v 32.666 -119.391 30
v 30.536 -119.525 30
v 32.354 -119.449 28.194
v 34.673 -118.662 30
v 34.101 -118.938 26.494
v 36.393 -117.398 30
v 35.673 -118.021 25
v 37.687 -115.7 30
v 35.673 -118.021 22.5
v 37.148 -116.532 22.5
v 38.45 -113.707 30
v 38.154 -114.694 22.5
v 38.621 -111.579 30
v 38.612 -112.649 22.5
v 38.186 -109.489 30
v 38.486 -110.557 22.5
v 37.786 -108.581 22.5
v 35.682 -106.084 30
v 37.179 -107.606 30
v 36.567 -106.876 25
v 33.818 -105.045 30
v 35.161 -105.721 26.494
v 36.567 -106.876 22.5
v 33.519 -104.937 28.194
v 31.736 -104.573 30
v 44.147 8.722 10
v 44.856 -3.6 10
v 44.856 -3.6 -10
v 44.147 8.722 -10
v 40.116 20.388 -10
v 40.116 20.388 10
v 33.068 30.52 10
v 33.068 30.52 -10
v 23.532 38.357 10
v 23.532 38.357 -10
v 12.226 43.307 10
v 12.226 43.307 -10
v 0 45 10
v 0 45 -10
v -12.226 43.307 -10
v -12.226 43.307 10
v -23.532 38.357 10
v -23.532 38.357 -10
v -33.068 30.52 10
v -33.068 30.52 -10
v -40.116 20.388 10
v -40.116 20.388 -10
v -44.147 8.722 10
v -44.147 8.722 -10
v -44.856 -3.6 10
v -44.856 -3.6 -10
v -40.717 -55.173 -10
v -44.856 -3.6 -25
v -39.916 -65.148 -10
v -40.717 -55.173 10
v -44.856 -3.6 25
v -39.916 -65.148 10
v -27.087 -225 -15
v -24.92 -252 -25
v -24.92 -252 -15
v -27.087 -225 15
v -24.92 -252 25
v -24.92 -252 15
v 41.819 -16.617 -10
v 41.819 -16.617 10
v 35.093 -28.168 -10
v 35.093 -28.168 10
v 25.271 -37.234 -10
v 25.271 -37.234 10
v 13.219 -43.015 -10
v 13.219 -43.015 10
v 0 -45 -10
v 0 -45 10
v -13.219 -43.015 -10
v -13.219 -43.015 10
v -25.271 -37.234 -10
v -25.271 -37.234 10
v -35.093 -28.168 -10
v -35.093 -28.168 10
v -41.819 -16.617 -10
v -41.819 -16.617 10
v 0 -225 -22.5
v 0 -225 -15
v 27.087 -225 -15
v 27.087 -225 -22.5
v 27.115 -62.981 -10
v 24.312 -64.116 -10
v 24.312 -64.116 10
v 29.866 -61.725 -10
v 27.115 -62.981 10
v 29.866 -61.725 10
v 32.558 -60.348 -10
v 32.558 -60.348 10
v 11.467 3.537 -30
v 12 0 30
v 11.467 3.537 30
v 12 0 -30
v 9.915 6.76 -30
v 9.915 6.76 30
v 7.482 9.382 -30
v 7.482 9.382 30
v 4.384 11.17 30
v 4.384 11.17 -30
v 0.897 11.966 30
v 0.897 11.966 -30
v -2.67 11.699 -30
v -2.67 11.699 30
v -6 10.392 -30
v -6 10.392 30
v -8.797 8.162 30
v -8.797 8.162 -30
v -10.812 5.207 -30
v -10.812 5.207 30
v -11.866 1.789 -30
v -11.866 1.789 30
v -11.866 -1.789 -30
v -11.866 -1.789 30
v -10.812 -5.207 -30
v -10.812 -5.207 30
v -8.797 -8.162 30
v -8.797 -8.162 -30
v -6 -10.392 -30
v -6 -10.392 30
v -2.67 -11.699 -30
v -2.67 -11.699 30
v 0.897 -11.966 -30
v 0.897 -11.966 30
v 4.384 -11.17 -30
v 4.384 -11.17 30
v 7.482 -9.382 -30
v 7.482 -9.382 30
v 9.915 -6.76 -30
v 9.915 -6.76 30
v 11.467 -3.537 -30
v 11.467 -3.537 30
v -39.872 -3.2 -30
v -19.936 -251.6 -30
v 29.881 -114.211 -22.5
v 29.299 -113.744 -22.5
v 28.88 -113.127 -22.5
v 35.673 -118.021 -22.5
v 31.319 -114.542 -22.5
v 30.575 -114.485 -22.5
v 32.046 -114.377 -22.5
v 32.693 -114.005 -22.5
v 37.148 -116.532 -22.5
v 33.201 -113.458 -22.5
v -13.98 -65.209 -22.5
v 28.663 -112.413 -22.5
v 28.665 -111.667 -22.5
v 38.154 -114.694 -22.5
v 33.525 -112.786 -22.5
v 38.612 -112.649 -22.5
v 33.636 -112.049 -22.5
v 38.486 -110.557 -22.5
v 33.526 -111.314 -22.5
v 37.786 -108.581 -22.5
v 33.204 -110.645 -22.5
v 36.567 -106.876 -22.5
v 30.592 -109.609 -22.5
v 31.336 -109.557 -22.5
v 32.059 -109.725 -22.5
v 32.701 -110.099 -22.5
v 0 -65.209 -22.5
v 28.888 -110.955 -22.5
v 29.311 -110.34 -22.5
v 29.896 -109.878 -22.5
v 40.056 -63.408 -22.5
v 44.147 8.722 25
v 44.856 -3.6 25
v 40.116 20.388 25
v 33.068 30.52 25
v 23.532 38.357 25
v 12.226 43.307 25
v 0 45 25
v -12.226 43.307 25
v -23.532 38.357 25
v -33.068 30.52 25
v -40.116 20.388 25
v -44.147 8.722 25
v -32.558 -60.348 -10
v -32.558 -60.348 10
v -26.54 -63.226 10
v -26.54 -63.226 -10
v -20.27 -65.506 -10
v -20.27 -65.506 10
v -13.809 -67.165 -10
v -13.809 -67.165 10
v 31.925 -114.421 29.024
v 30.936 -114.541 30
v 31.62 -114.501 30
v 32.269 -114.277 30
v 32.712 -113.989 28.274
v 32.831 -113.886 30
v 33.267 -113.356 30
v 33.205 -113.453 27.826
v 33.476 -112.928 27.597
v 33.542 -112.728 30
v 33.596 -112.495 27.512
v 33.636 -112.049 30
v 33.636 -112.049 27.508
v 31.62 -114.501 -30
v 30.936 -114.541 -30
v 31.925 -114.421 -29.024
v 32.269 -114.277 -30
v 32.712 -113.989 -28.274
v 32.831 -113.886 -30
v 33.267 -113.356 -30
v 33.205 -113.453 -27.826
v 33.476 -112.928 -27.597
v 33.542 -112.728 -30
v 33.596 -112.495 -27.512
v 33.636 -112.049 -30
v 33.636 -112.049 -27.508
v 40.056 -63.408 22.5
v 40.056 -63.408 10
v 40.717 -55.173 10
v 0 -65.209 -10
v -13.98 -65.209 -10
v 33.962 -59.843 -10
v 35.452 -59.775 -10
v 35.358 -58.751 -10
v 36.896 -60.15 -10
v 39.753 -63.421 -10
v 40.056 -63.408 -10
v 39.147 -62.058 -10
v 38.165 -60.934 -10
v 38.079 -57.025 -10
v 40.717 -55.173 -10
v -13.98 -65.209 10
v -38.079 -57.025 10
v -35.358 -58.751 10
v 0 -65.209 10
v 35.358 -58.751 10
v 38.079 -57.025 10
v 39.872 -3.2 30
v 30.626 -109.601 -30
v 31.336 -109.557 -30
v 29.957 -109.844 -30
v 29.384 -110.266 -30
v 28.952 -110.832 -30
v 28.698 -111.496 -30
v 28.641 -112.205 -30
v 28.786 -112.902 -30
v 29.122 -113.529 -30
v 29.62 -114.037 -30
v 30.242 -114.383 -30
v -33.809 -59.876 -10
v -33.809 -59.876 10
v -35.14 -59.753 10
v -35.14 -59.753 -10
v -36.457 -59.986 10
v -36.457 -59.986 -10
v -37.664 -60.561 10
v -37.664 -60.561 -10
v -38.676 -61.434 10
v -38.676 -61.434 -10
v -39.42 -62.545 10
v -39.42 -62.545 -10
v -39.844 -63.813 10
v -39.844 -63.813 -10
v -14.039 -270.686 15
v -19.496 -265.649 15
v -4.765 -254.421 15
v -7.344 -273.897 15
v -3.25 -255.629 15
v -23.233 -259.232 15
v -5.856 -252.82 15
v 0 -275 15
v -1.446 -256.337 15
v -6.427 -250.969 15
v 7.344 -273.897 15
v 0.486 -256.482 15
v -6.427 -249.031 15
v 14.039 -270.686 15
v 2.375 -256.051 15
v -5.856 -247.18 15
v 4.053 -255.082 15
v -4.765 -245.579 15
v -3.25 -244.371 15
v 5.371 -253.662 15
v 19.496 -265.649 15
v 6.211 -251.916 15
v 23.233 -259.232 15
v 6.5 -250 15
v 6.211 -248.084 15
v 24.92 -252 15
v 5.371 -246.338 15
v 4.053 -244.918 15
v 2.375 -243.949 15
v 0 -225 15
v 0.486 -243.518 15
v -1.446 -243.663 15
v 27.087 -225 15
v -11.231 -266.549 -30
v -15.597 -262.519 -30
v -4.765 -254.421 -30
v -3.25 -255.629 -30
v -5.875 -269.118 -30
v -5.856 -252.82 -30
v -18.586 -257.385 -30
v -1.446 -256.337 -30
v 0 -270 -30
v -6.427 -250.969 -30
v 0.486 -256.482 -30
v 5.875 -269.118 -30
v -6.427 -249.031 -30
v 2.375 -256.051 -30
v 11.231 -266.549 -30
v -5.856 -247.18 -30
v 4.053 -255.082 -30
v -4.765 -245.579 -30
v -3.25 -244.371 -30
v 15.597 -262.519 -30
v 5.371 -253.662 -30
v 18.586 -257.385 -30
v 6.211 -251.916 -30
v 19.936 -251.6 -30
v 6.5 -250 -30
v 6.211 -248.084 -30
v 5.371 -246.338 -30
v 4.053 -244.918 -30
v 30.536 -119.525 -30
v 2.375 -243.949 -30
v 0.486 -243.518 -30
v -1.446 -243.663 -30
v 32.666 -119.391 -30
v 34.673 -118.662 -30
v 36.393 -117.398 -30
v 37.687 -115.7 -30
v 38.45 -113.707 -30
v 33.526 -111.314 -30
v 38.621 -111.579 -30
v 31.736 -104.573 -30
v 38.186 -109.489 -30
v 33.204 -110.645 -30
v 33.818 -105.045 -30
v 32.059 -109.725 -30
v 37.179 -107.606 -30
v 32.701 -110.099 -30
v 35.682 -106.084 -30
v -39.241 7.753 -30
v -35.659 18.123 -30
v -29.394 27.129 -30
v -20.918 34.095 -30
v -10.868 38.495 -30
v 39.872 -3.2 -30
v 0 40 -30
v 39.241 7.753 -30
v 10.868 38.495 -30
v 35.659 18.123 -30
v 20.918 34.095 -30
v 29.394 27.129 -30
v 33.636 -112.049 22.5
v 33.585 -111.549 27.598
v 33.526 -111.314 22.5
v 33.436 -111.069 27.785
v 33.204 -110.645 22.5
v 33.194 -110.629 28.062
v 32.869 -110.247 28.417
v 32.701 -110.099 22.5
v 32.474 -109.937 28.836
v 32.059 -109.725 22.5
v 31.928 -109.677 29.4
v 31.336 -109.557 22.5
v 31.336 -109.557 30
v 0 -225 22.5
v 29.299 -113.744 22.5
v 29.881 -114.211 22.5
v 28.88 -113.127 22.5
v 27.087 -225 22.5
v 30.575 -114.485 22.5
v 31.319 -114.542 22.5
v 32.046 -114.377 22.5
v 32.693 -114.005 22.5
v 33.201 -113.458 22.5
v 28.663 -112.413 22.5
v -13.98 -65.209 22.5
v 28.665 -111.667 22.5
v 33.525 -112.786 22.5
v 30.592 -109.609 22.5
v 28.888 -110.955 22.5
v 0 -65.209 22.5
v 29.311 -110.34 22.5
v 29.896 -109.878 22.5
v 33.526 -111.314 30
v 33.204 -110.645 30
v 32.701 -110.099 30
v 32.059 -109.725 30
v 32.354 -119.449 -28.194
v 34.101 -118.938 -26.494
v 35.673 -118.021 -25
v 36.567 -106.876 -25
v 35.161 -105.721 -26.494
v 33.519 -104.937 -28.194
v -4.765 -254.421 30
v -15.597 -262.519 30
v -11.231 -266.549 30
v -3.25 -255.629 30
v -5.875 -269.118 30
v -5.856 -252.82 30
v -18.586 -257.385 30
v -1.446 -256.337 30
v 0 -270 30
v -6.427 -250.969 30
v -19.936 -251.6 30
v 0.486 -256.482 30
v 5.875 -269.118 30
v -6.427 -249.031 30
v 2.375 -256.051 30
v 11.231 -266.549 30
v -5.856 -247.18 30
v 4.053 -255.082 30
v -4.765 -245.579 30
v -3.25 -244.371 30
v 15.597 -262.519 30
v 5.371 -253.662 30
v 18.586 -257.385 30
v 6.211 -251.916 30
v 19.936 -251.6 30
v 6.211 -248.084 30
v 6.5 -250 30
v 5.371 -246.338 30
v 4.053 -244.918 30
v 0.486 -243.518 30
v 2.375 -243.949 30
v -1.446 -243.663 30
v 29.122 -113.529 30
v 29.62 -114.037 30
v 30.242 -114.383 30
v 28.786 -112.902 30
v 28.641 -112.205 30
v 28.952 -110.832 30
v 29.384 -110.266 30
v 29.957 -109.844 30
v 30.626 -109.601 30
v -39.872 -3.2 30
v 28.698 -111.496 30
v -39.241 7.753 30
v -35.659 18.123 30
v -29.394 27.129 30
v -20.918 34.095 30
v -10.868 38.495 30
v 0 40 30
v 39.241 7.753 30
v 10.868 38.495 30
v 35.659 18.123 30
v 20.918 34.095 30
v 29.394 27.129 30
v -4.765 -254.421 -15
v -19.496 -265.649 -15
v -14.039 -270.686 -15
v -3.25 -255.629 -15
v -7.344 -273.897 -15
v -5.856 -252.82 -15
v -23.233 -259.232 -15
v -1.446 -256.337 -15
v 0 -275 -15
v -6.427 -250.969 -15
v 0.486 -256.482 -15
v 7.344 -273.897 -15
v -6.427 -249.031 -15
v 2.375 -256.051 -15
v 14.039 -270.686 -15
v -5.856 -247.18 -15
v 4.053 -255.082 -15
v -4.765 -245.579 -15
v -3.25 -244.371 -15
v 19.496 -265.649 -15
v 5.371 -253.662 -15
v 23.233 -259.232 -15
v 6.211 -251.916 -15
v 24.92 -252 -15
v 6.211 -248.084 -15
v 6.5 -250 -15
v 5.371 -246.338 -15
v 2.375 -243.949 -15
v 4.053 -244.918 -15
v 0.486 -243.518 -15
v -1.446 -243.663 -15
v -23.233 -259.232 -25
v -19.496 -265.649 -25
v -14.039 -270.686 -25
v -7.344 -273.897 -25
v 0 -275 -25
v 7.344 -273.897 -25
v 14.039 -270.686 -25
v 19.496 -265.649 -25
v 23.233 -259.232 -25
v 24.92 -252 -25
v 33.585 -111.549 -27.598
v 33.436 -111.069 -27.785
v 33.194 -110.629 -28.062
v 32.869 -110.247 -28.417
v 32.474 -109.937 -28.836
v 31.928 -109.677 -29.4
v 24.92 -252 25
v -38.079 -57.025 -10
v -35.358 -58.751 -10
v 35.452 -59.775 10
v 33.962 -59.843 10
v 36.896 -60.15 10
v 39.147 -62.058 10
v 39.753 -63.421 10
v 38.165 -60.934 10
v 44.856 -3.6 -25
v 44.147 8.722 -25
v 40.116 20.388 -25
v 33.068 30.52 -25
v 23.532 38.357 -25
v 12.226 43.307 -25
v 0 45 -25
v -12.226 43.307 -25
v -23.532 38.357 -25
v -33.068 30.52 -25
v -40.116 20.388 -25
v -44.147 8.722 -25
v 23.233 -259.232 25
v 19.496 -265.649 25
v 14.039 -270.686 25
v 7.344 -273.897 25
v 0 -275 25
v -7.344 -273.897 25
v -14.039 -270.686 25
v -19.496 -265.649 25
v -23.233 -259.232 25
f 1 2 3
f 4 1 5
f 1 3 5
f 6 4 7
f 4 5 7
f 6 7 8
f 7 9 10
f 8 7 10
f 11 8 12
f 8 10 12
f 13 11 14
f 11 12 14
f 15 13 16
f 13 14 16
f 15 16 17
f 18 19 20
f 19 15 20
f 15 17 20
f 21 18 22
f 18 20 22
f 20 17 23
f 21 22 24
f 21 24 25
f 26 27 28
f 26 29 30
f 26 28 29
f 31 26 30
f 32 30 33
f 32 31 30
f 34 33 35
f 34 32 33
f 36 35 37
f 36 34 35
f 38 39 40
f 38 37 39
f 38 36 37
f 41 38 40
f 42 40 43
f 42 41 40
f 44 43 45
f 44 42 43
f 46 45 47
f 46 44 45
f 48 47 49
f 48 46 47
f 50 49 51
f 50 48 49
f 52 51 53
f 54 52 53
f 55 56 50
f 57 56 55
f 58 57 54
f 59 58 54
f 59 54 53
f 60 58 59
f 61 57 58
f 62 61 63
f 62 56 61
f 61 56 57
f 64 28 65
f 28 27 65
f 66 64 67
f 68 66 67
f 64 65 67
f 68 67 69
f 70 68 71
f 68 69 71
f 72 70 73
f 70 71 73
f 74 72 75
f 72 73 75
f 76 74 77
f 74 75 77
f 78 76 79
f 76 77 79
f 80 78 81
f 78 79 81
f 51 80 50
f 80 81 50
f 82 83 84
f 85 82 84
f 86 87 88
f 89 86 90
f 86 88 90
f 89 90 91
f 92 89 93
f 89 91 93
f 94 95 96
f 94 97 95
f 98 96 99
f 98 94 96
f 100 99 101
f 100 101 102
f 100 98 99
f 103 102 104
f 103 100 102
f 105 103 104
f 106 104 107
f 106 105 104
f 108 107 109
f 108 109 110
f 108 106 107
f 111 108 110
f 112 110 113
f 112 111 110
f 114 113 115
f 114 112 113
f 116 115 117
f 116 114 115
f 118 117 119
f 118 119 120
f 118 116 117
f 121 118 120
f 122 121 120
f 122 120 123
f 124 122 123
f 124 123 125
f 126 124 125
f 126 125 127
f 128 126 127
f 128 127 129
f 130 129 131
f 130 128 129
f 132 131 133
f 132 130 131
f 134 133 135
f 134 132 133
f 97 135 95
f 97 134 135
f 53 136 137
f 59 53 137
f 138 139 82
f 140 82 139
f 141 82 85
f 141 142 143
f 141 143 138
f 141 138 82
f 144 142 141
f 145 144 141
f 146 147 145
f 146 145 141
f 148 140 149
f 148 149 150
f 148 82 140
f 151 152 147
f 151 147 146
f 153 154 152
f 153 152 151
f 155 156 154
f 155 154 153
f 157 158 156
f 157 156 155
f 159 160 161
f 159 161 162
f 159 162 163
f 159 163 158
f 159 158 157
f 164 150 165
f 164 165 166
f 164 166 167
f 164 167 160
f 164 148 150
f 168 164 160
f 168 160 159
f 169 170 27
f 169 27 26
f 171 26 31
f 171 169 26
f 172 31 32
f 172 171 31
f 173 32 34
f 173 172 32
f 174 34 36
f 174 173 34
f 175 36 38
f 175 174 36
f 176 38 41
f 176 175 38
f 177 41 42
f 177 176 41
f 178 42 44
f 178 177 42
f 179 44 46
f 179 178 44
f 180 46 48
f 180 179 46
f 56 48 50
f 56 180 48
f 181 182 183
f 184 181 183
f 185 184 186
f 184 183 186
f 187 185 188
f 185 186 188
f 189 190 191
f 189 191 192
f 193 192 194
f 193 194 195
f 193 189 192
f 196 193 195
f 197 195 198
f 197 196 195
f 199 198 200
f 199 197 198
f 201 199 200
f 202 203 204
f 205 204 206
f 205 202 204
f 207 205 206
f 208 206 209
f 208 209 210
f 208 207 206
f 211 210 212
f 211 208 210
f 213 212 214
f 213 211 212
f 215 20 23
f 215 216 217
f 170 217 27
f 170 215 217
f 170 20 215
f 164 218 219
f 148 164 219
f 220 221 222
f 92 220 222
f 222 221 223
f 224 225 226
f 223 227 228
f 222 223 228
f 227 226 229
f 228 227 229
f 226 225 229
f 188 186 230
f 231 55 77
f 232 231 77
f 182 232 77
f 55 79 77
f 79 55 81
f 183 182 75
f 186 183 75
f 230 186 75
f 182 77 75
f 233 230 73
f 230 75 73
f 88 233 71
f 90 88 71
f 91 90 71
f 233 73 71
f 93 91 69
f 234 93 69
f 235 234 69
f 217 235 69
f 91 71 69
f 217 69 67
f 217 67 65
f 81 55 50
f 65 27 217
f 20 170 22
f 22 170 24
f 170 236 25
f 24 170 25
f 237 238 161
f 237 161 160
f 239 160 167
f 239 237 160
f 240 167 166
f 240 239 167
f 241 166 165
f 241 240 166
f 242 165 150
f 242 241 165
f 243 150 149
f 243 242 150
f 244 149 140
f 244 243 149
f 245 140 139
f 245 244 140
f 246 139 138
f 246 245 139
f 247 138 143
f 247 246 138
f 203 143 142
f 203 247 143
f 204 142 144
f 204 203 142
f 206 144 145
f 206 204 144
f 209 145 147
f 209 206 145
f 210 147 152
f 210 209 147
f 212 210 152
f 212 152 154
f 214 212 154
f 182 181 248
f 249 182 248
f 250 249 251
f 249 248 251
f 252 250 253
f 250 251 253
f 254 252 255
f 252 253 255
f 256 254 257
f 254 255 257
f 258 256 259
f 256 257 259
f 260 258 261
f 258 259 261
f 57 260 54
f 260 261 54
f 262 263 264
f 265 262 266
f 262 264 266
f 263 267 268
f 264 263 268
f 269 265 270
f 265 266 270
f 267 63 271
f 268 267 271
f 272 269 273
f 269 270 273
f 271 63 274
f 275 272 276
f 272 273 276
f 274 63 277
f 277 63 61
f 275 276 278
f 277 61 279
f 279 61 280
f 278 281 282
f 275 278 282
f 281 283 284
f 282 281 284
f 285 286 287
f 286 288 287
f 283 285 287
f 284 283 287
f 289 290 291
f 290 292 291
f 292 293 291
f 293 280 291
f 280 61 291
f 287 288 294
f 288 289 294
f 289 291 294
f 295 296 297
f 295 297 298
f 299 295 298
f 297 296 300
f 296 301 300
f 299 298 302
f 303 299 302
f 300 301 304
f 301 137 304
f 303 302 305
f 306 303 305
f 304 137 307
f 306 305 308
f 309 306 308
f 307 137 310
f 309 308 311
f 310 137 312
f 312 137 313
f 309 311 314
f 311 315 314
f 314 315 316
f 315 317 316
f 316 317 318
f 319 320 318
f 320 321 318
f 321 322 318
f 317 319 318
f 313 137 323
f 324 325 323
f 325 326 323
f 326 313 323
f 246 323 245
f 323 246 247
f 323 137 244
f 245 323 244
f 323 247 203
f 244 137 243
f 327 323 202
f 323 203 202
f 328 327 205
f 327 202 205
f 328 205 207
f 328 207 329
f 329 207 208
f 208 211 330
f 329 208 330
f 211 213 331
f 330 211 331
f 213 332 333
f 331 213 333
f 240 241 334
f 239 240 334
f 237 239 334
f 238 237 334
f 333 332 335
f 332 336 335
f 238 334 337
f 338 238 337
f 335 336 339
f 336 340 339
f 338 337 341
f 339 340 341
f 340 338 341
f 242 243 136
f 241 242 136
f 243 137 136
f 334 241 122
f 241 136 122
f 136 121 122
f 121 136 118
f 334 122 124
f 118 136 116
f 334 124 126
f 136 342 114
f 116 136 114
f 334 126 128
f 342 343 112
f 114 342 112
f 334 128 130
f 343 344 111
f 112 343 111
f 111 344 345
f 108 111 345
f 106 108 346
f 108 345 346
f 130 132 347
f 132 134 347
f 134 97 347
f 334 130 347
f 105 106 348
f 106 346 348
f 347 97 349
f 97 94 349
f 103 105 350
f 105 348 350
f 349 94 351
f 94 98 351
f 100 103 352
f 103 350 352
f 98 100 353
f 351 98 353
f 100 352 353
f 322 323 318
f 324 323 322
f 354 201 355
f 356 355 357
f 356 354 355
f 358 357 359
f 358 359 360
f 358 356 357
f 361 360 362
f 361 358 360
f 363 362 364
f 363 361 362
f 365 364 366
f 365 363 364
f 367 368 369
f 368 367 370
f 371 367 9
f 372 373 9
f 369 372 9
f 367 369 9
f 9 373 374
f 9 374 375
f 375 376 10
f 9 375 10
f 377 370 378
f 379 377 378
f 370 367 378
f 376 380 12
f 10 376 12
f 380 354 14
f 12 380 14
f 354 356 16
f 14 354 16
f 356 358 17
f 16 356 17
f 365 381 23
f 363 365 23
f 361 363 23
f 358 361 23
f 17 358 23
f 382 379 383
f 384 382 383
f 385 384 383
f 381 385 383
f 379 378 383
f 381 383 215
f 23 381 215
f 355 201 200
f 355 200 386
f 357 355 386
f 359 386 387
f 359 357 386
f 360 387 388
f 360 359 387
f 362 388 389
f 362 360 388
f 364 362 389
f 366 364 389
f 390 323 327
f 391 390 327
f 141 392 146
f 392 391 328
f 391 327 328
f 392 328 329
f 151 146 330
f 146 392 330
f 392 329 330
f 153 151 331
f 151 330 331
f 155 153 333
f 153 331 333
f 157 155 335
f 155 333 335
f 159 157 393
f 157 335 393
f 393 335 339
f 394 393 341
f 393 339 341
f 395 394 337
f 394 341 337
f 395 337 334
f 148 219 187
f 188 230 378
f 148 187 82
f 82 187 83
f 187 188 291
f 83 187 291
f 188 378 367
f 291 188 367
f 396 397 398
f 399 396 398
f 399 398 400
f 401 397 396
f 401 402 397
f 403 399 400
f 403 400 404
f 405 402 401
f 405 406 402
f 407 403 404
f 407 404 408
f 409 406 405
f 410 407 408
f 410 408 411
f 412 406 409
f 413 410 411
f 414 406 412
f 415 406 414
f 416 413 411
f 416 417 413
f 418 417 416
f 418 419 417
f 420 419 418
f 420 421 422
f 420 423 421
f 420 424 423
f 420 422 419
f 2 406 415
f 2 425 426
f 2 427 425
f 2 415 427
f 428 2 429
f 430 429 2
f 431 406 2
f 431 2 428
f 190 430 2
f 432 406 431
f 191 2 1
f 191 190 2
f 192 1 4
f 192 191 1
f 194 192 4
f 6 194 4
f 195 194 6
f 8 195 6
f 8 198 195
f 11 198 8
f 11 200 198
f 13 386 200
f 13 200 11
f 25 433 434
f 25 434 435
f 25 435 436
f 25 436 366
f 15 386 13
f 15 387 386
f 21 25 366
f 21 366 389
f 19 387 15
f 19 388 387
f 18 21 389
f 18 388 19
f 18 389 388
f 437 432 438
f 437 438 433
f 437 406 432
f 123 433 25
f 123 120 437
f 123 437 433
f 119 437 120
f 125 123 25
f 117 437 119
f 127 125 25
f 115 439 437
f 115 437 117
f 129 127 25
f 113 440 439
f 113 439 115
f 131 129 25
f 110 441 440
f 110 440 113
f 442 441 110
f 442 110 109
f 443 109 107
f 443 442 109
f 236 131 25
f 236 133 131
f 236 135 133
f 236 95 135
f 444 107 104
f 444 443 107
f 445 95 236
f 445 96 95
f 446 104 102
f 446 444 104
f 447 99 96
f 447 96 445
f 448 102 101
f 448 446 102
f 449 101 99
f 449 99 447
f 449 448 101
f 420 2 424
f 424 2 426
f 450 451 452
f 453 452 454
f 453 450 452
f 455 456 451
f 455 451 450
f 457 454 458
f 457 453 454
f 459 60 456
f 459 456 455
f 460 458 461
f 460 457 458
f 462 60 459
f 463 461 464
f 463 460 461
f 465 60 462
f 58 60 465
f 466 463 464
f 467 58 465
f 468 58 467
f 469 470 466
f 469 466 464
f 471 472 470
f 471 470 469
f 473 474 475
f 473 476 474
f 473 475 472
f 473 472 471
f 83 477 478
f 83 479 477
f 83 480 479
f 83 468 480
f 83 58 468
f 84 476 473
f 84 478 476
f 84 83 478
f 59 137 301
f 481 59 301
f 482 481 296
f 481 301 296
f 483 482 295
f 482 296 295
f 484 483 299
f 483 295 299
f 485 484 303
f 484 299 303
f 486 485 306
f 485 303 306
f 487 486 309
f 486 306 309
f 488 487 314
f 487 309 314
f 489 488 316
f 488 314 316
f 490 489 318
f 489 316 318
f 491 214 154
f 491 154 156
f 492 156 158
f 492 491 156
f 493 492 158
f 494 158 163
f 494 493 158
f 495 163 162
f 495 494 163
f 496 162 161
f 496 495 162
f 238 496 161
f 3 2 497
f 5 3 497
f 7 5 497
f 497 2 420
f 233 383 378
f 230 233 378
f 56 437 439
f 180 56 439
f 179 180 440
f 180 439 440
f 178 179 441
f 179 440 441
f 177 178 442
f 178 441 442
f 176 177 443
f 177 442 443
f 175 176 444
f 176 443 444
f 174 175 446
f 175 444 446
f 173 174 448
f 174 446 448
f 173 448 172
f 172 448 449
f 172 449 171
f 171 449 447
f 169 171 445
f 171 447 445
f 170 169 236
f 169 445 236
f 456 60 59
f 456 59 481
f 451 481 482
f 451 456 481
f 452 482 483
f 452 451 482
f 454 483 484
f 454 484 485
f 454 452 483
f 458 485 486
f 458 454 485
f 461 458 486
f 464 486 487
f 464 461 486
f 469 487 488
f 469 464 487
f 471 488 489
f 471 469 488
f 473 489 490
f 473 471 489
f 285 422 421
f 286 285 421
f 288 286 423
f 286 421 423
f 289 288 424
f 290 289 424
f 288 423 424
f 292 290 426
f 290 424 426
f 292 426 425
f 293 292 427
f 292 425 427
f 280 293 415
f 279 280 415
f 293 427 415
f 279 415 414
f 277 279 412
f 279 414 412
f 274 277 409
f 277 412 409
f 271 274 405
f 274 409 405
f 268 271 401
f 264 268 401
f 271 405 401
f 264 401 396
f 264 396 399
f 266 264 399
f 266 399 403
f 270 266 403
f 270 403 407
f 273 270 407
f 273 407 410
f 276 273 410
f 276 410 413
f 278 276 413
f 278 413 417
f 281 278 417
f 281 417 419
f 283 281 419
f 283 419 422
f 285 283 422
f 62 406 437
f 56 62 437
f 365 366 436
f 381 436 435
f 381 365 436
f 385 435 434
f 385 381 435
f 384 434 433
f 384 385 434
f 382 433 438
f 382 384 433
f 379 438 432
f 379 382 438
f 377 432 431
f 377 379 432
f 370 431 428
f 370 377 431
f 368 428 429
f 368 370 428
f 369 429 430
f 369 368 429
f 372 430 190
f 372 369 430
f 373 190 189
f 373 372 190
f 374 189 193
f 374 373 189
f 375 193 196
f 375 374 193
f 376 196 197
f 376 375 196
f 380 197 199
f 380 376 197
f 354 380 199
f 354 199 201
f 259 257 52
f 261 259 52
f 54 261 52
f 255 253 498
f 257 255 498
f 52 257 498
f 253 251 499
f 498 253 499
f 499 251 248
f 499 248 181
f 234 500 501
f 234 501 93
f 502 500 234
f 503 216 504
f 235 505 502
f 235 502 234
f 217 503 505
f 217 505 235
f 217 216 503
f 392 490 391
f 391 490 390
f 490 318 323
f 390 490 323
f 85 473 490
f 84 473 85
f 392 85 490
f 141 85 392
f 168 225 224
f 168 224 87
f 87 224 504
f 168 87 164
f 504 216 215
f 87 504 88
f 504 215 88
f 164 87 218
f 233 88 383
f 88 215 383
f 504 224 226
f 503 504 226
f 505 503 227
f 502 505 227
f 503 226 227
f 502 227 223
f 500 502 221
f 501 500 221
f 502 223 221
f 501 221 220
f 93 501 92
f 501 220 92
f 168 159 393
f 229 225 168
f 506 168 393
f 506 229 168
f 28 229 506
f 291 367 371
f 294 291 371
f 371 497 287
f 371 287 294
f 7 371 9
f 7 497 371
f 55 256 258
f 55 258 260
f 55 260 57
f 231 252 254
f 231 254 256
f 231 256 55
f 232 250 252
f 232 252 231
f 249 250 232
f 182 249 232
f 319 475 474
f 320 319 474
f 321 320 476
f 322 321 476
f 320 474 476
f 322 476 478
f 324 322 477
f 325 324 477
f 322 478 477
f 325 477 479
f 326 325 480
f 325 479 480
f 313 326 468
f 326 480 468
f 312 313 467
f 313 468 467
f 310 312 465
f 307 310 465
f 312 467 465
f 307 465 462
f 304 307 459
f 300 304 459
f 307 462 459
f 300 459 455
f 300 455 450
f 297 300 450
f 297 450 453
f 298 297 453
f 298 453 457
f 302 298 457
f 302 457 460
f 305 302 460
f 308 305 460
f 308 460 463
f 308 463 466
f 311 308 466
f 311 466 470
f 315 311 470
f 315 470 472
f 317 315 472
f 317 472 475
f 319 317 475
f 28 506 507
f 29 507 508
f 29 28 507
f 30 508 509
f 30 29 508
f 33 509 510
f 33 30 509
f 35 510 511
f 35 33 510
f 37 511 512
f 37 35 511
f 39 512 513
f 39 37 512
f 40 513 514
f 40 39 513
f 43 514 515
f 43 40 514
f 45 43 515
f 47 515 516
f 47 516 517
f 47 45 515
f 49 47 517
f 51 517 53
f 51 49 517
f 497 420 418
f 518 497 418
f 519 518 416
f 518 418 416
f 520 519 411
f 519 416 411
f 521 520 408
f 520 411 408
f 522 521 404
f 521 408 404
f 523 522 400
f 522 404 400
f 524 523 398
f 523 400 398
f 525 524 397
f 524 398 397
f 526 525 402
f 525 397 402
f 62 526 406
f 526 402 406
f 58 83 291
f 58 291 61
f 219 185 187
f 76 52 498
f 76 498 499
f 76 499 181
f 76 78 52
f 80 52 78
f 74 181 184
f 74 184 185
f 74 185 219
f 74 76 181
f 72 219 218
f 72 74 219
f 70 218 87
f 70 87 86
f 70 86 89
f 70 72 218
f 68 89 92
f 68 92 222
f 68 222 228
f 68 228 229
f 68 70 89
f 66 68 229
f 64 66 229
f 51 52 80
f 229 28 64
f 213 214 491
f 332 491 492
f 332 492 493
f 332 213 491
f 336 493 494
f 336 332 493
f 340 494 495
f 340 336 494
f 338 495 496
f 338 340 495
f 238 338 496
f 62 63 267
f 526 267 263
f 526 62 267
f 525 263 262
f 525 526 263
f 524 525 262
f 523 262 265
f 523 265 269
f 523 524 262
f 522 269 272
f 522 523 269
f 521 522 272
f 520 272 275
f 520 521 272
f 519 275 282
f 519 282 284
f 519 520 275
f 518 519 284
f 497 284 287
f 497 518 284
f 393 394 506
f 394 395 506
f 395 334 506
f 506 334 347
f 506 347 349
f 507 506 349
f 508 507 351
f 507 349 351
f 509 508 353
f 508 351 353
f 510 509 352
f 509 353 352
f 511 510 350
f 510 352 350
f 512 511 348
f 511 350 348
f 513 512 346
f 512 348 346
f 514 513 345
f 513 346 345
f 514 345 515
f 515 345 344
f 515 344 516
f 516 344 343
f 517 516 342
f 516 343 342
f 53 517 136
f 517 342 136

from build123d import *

# Parameters (mm, degrees)
SKETCH1_R                = 45
SKETCH1_R_2              = 12
BOSS_EXTRUDE1_DEPTH      = 30
SKETCH2_R                = 6.500000000000002
BOSS_EXTRUDE2_DEPTH      = 60.00000000000001
CUT_EXTRUDE1_DEPTH       = 15
CHAMFER1_SIZE            = 5
SKETCH4_R                = 68.57027417716169
CUT_EXTRUDE3_DEPTH       = 10
FILLET1_R                = 5
CUT_EXTRUDE4_DEPTH       = 281.26772914483035
CUT_EXTRUDE4_DEPTH_BACK  = 281.26772914483035
SKETCH5_R                = 2.5000000000000058
BOSS_EXTRUDE3_DEPTH      = 30
BOSS_EXTRUDE3_DEPTH_BACK = 30
SKETCH6_R                = 7.499999999999997
SKETCH6_R_2              = 2.5000000000000058
CUT_EXTRUDE5_DEPTH       = 22.5


with BuildPart() as part:
    # Sketch1 → Boss-Extrude1 (new, symmetric)
    with BuildSketch(Plane.XY):
        Circle(SKETCH1_R)
        Circle(SKETCH1_R_2, mode=Mode.SUBTRACT)
    extrude(amount=BOSS_EXTRUDE1_DEPTH, both=True)

    # Sketch2 → Boss-Extrude2 (add)
    with BuildSketch(Plane.XY.offset(30)):
        with BuildLine():
            Line((-44.85576885975762, -3.600000000000007), (-24.91987158875419, -252))
            ThreePointArc((-24.91987158875419, -252), (3.215e-14, -275), (24.91987158875426, -252))
            Line((24.91987158875426, -252), (44.85576885975761, -3.5999999999999956))
            ThreePointArc((44.85576885975761, -3.5999999999999956), (2.76e-15, -45.000000000000014), (-44.85576885975762, -3.600000000000007))
        make_face()
        with Locations((3.062e-14, -250)):
            Circle(SKETCH2_R, mode=Mode.SUBTRACT)
    extrude(amount=-BOSS_EXTRUDE2_DEPTH)

    # Sketch3 → Cut-Extrude1 (cut, symmetric)
    with BuildSketch(Plane.XY):
        with BuildLine():
            Line((-27.08681694429805, -225), (-24.91987158875419, -252))
            ThreePointArc((-24.91987158875419, -252), (3.215e-14, -275), (24.91987158875426, -252))
            Line((24.91987158875426, -252), (27.086816944298096, -225))
            Line((27.086816944298096, -225), (-27.08681694429805, -225))
        make_face()
    extrude(amount=CUT_EXTRUDE1_DEPTH, both=True, mode=Mode.SUBTRACT)

    # Chamfer1
    chamfer1_edges = [part.edges().sort_by_distance(p)[0] for p in [
        (-1.599e-14, 44.99999999999999, 30),
        (5.77e-15, 44.99999999999999, -29.99999999999991),
        (34.88782022425593, -127.8, -30.000000000000007),
        (3.042e-14, -275, -30.000000000000007),
        (-34.887820224255904, -127.80000000000001, -30.000000000000007),
        (-34.887820224255904, -127.80000000000001, 30),
        (3.042e-14, -275, 30),
        (34.88782022425593, -127.8, 30),
    ]]
    chamfer(chamfer1_edges, length=CHAMFER1_SIZE)

    # Sketch4 → Cut-Extrude3 (cut, symmetric)
    with BuildSketch(Plane.XY):
        Circle(SKETCH4_R)
        with BuildLine():
            ThreePointArc((44.99999999999999, 4.4e-16), (44.963927757087085, -1.8014440472726034), (44.8557688597576, -3.599999999999995))
            ThreePointArc((44.855768859757625, -3.600000000000005), (-8.27e-15, -45.00000000000002), (-44.855768859757625, -3.6000000000000085))
            ThreePointArc((-44.85576885975762, -3.6000000000000054), (-1.8014440472726134, 44.963927757087085), (44.99999999999999, 4.4e-16))
        make_face(mode=Mode.SUBTRACT)
    extrude(amount=CUT_EXTRUDE3_DEPTH, both=True, mode=Mode.SUBTRACT)

    # Fillet1
    # the kernel refuses this fillet: 5 mm, written as the material it takes off along each edge
    with BuildSketch(Plane(origin=(-40.716681036978386, -55.17276851911722, -10), x_dir=(0.07999999999999997, -0.9967948635501691, 0), z_dir=(0, 0, 1))) as fillet1_piece_1:
        with BuildLine():
            CenterArc((10.007537661154231, 4.999999999999998), FILLET1_R, 147.0642758003335, 122.9357241996666)
            ThreePointArc((5.81113251406956, 7.7184892572017425), (3.041676337682726, 3.7567694305680726), (0, 0))
            Line((0, 0), (10.007537661154236, 2e-17))
        make_face()
    extrude(amount=20, mode=Mode.SUBTRACT)
    with BuildSketch(Plane(origin=(40.7166810369784, -55.17276851911721, -10), x_dir=(-0.08000000000000003, -0.9967948635501691, 0), z_dir=(0, 0, 1))) as fillet1_piece_2:
        with BuildLine():
            CenterArc((10.007537661154224, -4.999999999999998), FILLET1_R, 89.99999999999993, 122.93572419966637)
            ThreePointArc((5.811132514069545, -7.718489257201729), (3.0416763376827105, -3.756769430568052), (0, 0))
            Line((0, 0), (10.00753766115423, -4e-17))
        make_face()
    extrude(amount=20, mode=Mode.SUBTRACT)

    # Sketch5 → Cut-Extrude4 (cut, two sides: drawn at the far end of the back side and taken through both)
    with BuildSketch(Plane.XY.offset(-CUT_EXTRUDE4_DEPTH_BACK)):
        with Locations(Location((31.135897271003447, -112.0487191029763, 0), (0, 0, 85.411434264))):
            Circle(SKETCH5_R)
    extrude(amount=CUT_EXTRUDE4_DEPTH + CUT_EXTRUDE4_DEPTH_BACK, mode=Mode.SUBTRACT)

    # Sketch6 → Boss-Extrude3 (add, two sides: drawn at the far end of the back side and taken through both)
    with BuildSketch(Plane.XY.offset(-BOSS_EXTRUDE3_DEPTH_BACK)):
        with Locations((31.135897271003447, -112.0487191029763)):
            Circle(SKETCH6_R)
        with Locations((31.135897271003447, -112.0487191029763)):
            Circle(SKETCH6_R_2, mode=Mode.SUBTRACT)
    extrude(amount=BOSS_EXTRUDE3_DEPTH + BOSS_EXTRUDE3_DEPTH_BACK)

    # Sketch8 → Cut-Extrude5 (cut, symmetric)
    with BuildSketch(Plane.XY):
        Polygon((39.65576885975762, -225), (39.655768859757615, -68.39166613076095), (40.05576885975761, -63.40769181301013), (0, -65.20900375479165), (-13.97990070496815, -65.20900375479165), (2.082e-14, -225), (27.086816944298096, -225), align=None)
    extrude(amount=CUT_EXTRUDE5_DEPTH, both=True, mode=Mode.SUBTRACT)


solid = part.part
